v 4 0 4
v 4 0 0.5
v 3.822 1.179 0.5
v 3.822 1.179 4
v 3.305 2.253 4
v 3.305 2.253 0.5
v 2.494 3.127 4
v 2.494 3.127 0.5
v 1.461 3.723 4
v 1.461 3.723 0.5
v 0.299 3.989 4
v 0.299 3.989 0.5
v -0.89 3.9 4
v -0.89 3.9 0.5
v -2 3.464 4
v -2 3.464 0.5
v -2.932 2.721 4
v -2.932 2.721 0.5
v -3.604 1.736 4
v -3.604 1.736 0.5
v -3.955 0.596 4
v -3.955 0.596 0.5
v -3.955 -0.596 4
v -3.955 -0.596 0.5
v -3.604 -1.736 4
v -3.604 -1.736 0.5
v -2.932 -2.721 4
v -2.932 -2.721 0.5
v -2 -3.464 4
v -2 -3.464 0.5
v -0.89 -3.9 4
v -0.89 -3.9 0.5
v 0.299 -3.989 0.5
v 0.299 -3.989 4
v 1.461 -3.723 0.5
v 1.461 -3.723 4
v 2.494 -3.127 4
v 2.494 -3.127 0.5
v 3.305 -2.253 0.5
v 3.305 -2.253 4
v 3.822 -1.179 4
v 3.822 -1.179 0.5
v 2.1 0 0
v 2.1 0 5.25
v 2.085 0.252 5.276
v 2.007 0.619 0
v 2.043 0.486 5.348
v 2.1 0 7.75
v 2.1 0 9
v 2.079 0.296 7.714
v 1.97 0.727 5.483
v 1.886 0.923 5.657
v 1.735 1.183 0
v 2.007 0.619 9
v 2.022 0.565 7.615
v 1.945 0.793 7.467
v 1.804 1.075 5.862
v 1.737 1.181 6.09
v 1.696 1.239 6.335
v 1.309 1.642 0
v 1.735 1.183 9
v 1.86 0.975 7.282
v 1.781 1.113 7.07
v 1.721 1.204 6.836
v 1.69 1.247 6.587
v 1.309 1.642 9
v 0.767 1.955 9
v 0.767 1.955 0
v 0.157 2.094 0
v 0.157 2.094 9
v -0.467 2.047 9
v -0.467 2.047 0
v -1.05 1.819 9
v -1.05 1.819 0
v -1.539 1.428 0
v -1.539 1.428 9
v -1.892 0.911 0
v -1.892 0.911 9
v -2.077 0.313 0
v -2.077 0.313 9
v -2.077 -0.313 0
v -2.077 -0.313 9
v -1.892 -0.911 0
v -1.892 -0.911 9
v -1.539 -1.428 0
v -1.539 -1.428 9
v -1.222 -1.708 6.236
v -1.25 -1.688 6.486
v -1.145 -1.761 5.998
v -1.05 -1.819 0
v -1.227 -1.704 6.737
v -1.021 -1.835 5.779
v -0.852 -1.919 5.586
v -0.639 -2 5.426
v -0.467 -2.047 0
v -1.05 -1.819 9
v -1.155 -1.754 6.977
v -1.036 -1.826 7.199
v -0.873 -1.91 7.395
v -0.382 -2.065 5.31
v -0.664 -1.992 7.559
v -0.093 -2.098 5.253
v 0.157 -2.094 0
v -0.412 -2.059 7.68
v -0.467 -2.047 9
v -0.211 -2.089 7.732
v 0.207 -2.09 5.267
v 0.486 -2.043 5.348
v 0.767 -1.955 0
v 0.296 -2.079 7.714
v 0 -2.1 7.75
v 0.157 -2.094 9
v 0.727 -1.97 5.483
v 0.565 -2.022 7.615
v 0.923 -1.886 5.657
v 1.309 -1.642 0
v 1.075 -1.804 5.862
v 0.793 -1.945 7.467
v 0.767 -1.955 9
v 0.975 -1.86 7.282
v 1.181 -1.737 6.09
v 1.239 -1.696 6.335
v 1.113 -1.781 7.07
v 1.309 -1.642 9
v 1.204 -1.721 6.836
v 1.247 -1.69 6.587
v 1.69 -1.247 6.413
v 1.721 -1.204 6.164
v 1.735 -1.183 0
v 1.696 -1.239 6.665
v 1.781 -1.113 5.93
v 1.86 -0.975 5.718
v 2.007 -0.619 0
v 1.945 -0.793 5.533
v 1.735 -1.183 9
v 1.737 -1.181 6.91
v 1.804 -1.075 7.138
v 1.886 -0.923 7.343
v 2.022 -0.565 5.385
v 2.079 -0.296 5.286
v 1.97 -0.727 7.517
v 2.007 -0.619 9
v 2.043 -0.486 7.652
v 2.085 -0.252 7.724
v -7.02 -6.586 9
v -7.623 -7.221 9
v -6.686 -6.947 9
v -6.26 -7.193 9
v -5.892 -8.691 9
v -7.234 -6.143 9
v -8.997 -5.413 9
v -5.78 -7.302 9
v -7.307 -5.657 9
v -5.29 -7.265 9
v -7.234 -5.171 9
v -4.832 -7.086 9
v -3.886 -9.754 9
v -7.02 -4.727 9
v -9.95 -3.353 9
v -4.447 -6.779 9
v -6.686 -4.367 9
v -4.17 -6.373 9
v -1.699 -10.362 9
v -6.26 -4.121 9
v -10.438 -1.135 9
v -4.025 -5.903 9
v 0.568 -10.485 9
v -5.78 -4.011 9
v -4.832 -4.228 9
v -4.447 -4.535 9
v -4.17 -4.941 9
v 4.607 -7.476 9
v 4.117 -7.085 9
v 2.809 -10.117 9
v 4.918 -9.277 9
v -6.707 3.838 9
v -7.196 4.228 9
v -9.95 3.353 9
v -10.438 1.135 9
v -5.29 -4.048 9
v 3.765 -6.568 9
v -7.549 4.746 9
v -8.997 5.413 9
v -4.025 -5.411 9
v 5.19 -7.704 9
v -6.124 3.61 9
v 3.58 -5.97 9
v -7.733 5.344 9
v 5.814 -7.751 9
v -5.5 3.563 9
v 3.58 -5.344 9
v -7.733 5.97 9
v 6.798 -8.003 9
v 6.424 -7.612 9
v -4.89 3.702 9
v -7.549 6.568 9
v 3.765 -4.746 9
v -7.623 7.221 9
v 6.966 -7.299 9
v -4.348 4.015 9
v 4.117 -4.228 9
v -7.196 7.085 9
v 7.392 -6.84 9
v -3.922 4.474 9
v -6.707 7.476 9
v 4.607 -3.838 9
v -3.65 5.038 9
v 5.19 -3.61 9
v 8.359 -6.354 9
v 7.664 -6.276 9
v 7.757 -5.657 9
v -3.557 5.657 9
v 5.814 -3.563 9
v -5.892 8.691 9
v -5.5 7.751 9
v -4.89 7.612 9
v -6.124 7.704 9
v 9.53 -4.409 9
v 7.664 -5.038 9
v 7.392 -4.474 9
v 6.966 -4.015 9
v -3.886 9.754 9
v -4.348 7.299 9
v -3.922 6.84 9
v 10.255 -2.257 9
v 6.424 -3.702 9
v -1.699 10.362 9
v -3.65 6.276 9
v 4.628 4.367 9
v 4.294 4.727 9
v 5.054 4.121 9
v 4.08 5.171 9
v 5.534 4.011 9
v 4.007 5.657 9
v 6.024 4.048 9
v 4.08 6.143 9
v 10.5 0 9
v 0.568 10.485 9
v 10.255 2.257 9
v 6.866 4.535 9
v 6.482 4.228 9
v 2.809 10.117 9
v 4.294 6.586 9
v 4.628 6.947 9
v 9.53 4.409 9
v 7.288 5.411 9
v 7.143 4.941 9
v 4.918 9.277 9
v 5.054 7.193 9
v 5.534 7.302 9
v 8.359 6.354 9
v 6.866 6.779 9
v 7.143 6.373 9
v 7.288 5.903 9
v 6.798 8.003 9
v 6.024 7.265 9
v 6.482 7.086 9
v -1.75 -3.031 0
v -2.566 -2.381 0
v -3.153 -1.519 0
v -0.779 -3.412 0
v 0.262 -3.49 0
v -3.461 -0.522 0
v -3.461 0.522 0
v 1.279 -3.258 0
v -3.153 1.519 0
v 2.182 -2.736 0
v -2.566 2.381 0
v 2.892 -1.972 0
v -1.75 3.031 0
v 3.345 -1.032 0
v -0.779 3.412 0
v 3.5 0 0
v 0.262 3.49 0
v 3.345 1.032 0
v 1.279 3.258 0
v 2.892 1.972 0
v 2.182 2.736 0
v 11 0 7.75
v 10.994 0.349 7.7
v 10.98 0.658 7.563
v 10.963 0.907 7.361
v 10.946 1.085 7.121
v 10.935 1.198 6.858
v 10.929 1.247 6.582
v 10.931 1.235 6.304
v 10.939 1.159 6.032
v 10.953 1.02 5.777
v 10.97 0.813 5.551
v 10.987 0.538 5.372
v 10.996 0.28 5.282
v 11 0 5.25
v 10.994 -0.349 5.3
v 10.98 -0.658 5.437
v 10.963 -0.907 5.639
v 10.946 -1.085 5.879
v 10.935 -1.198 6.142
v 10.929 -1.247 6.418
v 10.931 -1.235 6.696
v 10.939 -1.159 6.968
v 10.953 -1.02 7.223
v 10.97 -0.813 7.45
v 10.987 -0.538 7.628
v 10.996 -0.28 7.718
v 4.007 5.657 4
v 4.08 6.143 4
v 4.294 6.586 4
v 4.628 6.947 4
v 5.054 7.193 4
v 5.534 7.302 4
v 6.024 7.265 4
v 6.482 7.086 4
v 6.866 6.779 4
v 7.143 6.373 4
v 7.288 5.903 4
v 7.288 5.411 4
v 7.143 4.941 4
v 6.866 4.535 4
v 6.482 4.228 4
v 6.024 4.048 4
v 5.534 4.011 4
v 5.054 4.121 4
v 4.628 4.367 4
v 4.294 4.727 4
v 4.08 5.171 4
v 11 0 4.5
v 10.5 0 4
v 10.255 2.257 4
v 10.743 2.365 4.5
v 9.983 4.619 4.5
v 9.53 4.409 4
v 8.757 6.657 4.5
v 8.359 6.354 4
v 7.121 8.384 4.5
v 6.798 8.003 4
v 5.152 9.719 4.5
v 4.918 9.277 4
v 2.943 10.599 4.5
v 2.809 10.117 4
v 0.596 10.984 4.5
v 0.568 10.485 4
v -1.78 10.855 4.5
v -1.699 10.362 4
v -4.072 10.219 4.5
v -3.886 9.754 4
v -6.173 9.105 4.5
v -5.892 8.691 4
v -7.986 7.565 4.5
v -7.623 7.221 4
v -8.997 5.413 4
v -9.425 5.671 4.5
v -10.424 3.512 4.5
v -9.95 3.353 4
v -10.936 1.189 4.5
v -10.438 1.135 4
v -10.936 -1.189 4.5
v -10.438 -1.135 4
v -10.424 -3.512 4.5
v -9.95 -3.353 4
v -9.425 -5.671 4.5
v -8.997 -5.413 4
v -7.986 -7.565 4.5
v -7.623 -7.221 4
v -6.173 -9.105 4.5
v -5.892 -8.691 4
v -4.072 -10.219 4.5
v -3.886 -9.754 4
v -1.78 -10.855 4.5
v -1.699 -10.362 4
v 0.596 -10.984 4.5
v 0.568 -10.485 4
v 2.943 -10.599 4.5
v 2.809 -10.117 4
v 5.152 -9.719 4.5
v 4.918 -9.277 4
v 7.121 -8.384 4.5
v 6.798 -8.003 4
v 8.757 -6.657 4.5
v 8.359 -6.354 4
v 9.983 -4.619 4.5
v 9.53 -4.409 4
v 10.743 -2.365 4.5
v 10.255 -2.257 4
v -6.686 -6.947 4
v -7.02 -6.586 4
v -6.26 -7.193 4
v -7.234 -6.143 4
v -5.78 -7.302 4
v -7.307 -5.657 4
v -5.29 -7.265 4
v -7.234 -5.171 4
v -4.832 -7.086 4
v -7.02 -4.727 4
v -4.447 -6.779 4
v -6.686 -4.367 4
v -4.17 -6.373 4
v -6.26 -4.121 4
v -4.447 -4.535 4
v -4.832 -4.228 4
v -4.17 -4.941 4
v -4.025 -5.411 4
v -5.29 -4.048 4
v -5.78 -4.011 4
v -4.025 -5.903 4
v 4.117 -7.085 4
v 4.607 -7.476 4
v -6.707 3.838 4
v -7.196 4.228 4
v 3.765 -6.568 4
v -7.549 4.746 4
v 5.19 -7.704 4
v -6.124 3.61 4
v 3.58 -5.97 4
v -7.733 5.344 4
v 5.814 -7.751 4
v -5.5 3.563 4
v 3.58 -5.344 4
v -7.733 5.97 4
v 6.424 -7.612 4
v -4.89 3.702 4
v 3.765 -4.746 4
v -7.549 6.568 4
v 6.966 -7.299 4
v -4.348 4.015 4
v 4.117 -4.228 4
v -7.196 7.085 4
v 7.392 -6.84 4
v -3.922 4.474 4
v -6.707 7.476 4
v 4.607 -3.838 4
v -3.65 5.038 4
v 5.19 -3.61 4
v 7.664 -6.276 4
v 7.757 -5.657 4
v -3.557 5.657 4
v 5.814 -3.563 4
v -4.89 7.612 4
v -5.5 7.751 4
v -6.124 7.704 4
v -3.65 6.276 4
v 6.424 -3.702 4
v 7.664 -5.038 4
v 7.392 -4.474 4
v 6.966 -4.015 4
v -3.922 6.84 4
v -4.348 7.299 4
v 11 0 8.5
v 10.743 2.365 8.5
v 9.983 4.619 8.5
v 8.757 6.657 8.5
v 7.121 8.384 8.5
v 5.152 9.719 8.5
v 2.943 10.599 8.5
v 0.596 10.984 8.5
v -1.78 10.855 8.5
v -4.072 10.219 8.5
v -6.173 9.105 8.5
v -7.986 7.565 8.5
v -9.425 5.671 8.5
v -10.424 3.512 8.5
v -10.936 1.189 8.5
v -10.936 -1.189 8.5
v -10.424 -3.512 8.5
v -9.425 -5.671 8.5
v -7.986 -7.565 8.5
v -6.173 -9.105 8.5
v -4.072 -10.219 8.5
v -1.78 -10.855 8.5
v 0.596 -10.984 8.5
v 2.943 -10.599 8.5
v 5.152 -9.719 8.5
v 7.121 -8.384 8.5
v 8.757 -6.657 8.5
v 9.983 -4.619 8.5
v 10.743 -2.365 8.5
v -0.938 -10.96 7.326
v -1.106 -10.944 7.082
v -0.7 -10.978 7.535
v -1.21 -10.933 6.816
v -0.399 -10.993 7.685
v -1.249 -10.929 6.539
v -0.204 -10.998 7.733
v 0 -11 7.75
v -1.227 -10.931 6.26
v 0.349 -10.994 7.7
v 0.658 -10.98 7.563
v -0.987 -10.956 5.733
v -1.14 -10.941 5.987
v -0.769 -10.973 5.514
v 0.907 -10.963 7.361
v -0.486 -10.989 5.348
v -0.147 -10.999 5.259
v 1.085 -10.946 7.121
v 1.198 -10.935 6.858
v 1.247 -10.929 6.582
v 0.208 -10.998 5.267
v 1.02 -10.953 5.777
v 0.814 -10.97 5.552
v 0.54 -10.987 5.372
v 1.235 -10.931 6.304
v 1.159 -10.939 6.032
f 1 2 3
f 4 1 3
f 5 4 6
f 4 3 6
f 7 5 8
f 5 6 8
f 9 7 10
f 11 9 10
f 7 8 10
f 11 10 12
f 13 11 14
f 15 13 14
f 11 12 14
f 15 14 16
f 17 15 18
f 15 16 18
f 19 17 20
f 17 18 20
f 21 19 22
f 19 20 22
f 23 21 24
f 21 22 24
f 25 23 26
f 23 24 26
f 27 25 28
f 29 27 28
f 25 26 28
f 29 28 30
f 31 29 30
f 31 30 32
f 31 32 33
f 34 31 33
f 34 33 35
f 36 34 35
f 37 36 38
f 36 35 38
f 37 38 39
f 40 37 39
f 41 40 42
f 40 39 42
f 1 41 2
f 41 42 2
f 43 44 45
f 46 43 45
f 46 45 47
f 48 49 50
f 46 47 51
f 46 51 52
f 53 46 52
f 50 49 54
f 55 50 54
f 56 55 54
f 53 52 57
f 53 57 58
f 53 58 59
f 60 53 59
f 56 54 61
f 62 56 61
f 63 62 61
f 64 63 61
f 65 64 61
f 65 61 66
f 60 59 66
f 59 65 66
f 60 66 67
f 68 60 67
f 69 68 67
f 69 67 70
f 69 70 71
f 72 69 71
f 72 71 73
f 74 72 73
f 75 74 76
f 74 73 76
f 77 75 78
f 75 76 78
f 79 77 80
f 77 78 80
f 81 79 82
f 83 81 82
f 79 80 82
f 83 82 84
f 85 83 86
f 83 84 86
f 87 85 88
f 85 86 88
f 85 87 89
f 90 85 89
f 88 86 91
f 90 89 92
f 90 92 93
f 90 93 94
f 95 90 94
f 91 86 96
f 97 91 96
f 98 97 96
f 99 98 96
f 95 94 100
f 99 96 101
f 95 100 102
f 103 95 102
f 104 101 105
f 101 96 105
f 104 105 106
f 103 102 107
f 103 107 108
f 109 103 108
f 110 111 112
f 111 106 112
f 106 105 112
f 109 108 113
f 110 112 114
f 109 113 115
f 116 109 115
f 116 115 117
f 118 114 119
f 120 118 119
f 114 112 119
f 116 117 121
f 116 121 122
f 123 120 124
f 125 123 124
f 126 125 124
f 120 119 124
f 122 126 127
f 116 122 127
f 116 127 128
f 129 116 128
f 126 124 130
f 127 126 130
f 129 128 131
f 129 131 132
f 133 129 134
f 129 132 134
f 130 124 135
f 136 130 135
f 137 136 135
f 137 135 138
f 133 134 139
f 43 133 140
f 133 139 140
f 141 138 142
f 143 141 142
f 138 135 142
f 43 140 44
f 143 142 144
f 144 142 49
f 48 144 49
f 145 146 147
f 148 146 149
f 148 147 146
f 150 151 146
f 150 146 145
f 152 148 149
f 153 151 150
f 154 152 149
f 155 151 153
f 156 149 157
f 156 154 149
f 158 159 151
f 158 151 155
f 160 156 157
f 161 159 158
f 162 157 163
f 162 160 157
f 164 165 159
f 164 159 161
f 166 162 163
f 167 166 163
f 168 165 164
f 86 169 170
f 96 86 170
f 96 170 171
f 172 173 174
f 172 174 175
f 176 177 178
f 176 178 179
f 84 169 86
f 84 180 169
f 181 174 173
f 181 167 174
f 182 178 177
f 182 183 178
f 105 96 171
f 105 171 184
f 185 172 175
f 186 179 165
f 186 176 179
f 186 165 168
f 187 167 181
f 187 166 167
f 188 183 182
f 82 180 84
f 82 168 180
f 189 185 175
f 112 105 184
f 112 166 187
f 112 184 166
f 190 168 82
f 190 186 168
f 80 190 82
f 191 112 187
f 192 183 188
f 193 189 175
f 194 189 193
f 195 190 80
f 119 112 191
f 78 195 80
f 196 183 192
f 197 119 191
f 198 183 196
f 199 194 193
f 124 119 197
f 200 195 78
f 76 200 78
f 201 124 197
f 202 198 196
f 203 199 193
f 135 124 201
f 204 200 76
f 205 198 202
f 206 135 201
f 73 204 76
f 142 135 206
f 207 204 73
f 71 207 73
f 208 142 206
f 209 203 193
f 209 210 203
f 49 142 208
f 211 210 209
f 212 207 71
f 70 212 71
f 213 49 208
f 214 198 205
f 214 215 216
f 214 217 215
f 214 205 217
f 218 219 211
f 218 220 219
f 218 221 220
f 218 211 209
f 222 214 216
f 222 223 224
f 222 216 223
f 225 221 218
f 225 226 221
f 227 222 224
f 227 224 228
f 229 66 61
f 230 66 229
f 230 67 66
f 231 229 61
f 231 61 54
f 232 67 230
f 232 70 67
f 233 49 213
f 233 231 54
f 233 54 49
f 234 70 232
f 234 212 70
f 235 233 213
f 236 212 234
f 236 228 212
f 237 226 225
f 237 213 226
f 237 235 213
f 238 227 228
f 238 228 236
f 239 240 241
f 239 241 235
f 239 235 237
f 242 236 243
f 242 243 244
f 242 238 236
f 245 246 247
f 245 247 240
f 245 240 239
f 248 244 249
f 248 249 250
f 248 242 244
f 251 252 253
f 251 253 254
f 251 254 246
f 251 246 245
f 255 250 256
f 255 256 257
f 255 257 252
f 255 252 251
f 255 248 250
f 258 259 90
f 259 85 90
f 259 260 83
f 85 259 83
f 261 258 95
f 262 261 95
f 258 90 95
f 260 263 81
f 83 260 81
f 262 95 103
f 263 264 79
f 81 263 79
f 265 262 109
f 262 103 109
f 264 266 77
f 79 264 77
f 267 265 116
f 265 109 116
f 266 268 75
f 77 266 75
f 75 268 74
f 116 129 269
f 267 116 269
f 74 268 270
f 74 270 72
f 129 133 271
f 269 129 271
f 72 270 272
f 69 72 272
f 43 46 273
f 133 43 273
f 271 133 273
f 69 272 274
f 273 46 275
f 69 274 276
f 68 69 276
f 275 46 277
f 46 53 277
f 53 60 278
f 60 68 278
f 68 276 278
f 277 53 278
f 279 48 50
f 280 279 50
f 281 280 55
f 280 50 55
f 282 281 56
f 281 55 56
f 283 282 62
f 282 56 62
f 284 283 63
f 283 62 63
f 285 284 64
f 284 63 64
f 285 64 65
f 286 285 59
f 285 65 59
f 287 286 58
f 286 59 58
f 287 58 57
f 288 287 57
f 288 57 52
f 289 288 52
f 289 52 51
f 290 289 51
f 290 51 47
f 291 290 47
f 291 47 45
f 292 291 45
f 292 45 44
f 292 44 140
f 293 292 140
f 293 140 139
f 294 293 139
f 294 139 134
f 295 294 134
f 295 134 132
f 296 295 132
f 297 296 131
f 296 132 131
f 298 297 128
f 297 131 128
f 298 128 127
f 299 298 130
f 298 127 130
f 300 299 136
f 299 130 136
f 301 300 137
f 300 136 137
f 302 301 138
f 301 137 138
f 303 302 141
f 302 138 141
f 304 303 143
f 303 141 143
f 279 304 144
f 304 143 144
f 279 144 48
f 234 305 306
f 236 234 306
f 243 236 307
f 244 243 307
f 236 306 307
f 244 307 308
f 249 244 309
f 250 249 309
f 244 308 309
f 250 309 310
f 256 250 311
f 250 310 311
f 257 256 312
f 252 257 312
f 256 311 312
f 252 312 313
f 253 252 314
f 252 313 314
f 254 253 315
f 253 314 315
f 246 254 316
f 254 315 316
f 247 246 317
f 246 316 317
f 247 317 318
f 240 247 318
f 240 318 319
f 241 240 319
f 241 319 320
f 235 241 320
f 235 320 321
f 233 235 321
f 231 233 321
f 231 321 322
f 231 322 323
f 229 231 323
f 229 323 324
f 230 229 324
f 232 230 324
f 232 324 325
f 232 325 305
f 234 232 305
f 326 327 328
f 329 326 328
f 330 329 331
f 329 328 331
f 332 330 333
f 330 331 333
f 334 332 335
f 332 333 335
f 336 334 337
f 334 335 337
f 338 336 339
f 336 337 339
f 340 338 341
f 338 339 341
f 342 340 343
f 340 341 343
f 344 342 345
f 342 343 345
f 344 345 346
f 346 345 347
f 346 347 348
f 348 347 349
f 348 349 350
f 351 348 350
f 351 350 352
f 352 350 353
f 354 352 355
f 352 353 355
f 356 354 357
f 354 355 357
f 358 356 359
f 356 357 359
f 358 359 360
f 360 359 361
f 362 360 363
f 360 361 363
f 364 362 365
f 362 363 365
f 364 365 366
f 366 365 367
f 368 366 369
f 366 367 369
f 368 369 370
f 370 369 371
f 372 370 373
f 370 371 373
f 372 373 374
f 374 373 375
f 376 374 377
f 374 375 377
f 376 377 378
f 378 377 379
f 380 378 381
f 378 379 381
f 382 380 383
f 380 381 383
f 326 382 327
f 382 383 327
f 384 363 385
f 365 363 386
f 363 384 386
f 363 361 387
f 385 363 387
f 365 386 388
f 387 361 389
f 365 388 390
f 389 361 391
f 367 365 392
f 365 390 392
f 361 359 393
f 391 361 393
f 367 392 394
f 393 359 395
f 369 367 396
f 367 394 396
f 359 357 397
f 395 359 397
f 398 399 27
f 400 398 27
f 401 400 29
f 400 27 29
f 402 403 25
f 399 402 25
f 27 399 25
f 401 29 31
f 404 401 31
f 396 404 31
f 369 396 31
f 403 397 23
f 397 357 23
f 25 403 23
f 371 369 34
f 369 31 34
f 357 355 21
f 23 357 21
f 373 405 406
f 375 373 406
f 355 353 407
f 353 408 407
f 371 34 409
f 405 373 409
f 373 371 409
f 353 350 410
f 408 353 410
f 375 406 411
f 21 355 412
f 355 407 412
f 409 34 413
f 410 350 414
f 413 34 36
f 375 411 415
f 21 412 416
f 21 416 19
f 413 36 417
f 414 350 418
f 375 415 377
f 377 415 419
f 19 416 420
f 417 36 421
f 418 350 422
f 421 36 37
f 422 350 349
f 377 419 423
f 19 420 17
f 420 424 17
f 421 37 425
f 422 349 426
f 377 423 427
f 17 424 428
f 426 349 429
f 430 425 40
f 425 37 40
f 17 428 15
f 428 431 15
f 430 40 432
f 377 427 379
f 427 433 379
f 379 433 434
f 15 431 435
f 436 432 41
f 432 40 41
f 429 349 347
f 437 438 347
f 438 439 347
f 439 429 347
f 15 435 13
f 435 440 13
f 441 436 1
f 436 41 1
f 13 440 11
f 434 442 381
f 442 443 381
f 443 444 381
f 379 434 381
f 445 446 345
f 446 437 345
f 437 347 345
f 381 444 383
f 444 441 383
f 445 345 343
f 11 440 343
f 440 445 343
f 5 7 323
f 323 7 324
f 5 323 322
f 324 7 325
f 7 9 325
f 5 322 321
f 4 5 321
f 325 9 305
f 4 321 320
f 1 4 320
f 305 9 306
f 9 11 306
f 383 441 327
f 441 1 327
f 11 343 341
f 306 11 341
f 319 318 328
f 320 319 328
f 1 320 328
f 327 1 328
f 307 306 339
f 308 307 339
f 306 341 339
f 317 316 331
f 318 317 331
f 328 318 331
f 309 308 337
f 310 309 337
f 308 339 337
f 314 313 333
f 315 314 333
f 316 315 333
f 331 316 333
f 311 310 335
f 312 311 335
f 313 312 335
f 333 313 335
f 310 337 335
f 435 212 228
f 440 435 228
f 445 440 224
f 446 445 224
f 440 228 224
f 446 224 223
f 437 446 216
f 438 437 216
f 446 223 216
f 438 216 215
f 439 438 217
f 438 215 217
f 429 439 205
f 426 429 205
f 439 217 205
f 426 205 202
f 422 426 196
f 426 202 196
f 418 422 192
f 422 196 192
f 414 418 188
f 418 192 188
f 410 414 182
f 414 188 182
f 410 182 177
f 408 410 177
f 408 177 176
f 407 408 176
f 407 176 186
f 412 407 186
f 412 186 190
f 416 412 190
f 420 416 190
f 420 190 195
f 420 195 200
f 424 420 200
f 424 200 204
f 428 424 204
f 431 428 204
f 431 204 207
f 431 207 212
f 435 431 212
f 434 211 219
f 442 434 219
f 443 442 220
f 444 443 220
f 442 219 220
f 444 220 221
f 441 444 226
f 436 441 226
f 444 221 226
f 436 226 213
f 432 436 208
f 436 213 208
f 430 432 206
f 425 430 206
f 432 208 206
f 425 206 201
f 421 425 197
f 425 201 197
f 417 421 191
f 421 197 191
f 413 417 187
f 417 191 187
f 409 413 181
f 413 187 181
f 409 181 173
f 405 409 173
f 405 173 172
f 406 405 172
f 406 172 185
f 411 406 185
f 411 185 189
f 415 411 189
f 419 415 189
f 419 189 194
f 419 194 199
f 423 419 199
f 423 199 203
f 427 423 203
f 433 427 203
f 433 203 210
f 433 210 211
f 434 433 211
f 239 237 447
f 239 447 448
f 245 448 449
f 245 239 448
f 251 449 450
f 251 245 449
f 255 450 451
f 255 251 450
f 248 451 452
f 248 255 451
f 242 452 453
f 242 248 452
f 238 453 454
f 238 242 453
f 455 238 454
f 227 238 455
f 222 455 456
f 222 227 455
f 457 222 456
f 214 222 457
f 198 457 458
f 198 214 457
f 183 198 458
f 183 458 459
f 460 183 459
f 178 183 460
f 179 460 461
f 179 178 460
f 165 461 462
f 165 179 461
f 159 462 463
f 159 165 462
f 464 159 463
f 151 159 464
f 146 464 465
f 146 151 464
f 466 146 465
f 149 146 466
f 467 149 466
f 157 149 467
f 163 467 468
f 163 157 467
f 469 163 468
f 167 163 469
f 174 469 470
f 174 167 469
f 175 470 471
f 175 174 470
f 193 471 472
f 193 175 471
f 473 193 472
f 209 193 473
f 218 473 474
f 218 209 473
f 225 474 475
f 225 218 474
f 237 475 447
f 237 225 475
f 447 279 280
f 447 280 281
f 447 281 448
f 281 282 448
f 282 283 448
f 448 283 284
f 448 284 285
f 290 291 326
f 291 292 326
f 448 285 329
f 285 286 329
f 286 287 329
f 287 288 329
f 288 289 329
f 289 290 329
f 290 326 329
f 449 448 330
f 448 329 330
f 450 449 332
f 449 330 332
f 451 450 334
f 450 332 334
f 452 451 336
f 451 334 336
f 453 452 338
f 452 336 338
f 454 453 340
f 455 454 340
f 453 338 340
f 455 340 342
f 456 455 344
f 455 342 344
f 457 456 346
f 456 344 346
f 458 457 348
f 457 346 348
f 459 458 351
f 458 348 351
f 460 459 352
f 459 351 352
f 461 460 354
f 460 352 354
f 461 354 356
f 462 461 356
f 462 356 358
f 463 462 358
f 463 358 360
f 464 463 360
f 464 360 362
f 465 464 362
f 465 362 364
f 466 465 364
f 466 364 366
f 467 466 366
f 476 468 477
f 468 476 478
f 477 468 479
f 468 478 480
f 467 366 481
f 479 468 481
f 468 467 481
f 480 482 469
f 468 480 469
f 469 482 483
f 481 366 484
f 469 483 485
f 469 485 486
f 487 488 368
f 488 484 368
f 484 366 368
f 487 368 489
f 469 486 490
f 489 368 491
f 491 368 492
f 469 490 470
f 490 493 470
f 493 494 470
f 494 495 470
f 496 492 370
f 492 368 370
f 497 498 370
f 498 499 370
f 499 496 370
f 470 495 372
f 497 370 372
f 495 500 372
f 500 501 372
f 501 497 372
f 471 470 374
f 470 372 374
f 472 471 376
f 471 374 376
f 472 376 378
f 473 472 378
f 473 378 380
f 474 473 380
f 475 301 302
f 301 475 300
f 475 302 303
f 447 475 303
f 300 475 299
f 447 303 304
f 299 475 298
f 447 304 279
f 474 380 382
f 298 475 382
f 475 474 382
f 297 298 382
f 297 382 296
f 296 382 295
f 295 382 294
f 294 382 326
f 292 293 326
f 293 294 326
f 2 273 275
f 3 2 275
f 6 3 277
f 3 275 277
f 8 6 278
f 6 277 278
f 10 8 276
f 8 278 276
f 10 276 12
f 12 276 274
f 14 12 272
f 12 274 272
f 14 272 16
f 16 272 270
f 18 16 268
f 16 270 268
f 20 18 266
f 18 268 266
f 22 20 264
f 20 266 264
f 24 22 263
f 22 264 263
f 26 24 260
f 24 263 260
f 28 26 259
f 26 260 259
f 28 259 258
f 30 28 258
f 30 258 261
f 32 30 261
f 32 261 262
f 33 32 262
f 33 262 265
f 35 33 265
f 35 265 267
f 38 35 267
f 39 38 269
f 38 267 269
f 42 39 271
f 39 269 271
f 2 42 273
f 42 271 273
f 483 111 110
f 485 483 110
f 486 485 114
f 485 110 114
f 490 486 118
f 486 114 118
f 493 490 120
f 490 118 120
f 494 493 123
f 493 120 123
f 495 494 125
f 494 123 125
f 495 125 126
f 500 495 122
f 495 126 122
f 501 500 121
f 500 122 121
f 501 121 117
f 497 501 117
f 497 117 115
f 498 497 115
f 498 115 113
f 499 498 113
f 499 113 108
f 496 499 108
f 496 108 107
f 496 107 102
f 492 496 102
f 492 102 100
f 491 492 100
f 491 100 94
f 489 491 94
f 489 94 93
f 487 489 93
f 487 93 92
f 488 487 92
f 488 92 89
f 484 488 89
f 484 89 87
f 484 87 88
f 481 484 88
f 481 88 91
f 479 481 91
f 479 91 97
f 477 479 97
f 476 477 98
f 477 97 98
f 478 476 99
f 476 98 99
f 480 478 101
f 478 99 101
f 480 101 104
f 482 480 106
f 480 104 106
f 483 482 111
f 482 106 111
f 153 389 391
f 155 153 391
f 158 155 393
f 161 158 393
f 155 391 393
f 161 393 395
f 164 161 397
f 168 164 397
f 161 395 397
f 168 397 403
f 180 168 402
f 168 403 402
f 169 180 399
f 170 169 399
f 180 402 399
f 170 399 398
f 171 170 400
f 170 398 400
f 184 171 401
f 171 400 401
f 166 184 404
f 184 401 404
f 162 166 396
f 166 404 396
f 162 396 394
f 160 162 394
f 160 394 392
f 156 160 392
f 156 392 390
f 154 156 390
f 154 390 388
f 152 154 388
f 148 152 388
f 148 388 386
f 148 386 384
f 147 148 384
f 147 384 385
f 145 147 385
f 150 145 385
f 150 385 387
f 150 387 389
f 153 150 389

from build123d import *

# Parameters (mm, degrees)
ESQUISSE1_R                  = 4
BOSS_EXTRU_1_DEPTH           = 4
ESQUISSE2_R                  = 11
BOSS_EXTRU_2_DEPTH           = 5
ESQUISSE3_R                  = 2.1
ENL_V_MAT_EXTRU_1_DEPTH      = 18.972200756
TROU_TARAUD_M41_D            = 3.3
ESQUISSE6_R                  = 1.25
ENL_V_MAT_EXTRU_2_DEPTH      = 18.972200756
R_P_TITION_CIRCULAIRE1_COUNT = 2
R_P_TITION_CIRCULAIRE1_ANGLE = 90
CHANFREIN1_SIZE              = 0.5


with BuildPart() as part:
    # Esquisse1 → Boss.-Extru.1 (new body)
    with BuildSketch(Plane.XY):
        Circle(ESQUISSE1_R)
    extrude(amount=BOSS_EXTRU_1_DEPTH)

    # Esquisse2 → Boss.-Extru.2 (add)
    with BuildSketch(Plane.XY.offset(4)):
        Circle(ESQUISSE2_R)
    extrude(amount=BOSS_EXTRU_2_DEPTH)

    # Esquisse3 → Enlèv. mat.-Extru.1 (cut, through all)
    with BuildSketch(Plane.XY.offset(9)):
        with Locations((-5.656854249, 5.656854249)):
            Circle(ESQUISSE3_R)
        with Locations((5.656854249, -5.656854249)):
            Circle(ESQUISSE3_R)
        Circle(ESQUISSE3_R)
    extrude(amount=-ENL_V_MAT_EXTRU_1_DEPTH, mode=Mode.SUBTRACT)

    # Trou taraudé M41 (through all)
    with Locations(Plane.XY.offset(9)):
        with Locations((5.656854249, 5.656854249), (-5.656854249, -5.656854249)):
            Hole(TROU_TARAUD_M41_D / 2)

    # Esquisse6 → Enlèv. mat.-Extru.2 (cut, through all)
    with BuildSketch(Plane(origin=(0, 0, 0), x_dir=(1, 0, 0), z_dir=(0, 1, 0))):
        with Locations(Location((0, -6.5, 0), (0, 0, 270))):
            Circle(ESQUISSE6_R)
    enl_v_mat_extru_2 = extrude(amount=-ENL_V_MAT_EXTRU_2_DEPTH, mode=Mode.SUBTRACT)

    # Répétition circulaire1: Enlèv. mat.-Extru.2 ×2 about axis
    r_p_tition_circulaire1_axis = Axis((0, 0, 9), (0, 0, 1))
    for i in range(1, R_P_TITION_CIRCULAIRE1_COUNT):
        add(enl_v_mat_extru_2.rotate(r_p_tition_circulaire1_axis, i * R_P_TITION_CIRCULAIRE1_ANGLE / (R_P_TITION_CIRCULAIRE1_COUNT - 1)), mode=Mode.SUBTRACT)

    # Chanfrein1
    chanfrein1_edges = [part.edges().sort_by_distance(p)[0] for p in [
        (-4, 0, 0),
        (-11, 0, 4),
        (-11, 0, 9),
    ]]
    chamfer(chanfrein1_edges, length=CHANFREIN1_SIZE)


solid = part.part
